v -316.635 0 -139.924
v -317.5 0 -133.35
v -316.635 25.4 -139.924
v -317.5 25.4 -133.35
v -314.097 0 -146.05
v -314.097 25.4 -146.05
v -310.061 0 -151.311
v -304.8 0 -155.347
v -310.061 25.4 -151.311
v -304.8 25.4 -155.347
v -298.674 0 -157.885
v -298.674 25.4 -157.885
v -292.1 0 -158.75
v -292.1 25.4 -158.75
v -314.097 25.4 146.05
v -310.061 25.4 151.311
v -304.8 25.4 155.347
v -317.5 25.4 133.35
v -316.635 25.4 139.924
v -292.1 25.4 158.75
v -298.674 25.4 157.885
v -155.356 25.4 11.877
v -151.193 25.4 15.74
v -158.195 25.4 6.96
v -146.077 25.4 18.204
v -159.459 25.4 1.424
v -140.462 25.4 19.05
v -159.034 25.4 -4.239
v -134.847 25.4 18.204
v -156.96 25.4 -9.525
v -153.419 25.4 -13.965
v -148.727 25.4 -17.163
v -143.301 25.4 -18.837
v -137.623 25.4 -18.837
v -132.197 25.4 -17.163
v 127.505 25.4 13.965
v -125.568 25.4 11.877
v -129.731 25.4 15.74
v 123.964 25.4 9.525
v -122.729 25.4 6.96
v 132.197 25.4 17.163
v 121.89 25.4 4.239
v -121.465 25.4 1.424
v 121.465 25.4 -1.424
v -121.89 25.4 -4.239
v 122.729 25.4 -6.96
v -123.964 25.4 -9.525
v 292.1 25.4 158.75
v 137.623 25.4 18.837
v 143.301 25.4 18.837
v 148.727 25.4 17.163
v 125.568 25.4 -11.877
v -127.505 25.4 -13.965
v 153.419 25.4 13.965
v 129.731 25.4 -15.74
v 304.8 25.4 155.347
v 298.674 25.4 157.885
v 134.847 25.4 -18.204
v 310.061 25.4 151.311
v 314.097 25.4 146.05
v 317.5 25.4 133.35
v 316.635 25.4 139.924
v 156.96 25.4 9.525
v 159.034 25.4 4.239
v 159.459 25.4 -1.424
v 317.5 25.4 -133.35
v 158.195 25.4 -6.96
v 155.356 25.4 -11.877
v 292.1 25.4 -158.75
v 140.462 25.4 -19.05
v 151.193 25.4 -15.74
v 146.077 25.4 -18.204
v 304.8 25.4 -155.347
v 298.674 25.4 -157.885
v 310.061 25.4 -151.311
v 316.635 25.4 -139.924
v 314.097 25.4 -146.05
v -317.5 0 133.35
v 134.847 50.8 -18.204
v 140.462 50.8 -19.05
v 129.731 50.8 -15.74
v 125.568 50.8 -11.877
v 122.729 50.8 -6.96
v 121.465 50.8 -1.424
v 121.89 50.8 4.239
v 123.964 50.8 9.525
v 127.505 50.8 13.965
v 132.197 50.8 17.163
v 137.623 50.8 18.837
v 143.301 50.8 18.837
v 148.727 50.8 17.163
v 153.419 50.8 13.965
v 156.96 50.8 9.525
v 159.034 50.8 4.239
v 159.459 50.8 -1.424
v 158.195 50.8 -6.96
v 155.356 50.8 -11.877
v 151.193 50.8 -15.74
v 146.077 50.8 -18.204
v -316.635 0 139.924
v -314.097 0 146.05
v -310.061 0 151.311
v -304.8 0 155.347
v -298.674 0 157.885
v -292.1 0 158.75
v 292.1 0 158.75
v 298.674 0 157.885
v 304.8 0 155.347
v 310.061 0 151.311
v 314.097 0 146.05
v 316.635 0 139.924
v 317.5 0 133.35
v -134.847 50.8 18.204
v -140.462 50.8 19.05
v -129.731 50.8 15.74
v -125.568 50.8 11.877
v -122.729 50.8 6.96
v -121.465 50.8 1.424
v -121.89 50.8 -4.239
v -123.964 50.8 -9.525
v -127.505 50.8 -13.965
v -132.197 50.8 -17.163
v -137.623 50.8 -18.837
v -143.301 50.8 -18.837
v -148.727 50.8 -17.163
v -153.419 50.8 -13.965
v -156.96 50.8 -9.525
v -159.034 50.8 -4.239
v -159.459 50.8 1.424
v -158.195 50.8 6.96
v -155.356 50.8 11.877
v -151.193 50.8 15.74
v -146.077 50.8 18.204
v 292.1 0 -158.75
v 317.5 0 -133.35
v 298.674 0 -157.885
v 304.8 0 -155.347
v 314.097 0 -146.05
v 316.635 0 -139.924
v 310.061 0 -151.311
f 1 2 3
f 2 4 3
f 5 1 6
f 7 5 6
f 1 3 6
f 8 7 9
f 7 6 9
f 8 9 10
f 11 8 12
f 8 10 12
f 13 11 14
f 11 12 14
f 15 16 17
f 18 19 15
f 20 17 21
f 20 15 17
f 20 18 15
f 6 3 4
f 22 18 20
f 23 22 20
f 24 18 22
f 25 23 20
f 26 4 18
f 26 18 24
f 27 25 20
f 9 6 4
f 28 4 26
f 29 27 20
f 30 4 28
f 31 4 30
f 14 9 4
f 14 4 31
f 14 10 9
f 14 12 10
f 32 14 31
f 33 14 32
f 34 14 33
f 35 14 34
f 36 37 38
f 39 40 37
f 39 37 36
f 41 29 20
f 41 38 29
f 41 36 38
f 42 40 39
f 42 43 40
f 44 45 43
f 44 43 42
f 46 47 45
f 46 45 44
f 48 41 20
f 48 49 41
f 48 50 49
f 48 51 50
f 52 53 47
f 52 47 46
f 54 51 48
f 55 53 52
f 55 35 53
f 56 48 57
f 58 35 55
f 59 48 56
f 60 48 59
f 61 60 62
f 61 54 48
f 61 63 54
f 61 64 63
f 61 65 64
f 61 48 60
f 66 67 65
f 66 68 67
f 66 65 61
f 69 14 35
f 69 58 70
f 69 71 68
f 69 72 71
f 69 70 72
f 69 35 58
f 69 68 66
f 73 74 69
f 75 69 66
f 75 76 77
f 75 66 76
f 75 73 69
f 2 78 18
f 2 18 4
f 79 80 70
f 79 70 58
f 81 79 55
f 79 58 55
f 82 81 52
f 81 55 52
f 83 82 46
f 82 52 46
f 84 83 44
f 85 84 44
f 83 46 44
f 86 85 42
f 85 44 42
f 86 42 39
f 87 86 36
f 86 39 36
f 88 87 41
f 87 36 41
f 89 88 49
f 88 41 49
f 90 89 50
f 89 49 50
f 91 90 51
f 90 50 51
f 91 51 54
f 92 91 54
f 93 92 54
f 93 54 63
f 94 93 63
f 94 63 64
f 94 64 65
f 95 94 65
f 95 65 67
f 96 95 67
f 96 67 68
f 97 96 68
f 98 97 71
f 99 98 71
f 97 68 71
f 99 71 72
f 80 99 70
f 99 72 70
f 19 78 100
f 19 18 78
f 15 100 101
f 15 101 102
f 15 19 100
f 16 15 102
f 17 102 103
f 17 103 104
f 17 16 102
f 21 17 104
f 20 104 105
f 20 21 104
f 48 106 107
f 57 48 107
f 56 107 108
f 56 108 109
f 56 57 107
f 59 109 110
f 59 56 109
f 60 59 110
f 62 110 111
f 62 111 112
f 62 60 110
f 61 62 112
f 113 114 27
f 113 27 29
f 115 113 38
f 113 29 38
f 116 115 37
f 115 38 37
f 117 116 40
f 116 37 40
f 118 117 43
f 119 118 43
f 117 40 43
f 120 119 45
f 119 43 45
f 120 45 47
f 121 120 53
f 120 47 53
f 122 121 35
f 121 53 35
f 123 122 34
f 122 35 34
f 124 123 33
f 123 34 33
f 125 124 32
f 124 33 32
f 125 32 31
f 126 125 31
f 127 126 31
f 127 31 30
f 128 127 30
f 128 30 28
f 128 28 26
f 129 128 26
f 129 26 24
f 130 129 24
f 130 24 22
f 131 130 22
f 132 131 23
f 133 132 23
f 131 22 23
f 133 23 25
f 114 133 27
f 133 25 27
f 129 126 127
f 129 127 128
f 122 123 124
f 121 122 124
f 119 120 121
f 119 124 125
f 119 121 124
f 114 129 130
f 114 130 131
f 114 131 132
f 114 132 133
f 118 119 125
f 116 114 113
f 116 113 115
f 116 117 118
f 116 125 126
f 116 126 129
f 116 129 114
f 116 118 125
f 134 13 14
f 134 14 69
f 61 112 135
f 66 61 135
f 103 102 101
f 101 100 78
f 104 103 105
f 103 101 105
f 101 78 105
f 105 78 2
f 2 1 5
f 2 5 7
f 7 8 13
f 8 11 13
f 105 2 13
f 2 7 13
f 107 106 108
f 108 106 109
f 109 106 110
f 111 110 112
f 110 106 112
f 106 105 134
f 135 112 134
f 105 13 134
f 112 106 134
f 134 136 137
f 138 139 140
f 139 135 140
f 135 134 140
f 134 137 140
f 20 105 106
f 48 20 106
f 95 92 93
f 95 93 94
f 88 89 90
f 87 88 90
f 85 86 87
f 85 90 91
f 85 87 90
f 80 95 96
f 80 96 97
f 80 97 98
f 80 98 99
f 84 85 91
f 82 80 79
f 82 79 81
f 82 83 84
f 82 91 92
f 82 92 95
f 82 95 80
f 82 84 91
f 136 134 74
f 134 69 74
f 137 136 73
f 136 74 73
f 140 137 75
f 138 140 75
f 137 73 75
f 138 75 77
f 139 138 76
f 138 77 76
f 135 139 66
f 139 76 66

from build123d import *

# Parameters (mm, degrees)
SKETCH1_W           = 635
SKETCH1_H           = 317.5
BOSS_EXTRUDE1_DEPTH = 25.4
SKETCH2_R           = 19.05
BOSS_EXTRUDE2_DEPTH = 25.4
FILLET1_R           = 25.4


with BuildPart() as part:
    # Sketch1 → Boss-Extrude1 (new body)
    with BuildSketch(Plane(origin=(0, 0, 0), x_dir=(1, 0, 0), z_dir=(0, 1, 0))):
        Rectangle(SKETCH1_W, SKETCH1_H)
    extrude(amount=BOSS_EXTRUDE1_DEPTH)

    # Sketch2 → Boss-Extrude2 (add)
    with BuildSketch(Plane(origin=(0, 25.4, 0), x_dir=(1, 0, 0), z_dir=(0, 1, 0))):
        with Locations(Location((-140.462, 0, 0), (0, 0, 270))):
            Circle(SKETCH2_R)
        with Locations(Location((140.462, 0, 0), (0, 0, 90))):
            Circle(SKETCH2_R)
    extrude(amount=BOSS_EXTRUDE2_DEPTH)

    # Fillet1
    fillet1_edges = [part.edges().sort_by_distance(p)[0] for p in [
        (317.5, 12.7, 158.75),
        (-317.5, 12.7, 158.75),
        (-317.5, 12.7, -158.75),
        (317.5, 12.7, -158.75),
    ]]
    fillet(fillet1_edges, radius=FILLET1_R)


solid = part.part
